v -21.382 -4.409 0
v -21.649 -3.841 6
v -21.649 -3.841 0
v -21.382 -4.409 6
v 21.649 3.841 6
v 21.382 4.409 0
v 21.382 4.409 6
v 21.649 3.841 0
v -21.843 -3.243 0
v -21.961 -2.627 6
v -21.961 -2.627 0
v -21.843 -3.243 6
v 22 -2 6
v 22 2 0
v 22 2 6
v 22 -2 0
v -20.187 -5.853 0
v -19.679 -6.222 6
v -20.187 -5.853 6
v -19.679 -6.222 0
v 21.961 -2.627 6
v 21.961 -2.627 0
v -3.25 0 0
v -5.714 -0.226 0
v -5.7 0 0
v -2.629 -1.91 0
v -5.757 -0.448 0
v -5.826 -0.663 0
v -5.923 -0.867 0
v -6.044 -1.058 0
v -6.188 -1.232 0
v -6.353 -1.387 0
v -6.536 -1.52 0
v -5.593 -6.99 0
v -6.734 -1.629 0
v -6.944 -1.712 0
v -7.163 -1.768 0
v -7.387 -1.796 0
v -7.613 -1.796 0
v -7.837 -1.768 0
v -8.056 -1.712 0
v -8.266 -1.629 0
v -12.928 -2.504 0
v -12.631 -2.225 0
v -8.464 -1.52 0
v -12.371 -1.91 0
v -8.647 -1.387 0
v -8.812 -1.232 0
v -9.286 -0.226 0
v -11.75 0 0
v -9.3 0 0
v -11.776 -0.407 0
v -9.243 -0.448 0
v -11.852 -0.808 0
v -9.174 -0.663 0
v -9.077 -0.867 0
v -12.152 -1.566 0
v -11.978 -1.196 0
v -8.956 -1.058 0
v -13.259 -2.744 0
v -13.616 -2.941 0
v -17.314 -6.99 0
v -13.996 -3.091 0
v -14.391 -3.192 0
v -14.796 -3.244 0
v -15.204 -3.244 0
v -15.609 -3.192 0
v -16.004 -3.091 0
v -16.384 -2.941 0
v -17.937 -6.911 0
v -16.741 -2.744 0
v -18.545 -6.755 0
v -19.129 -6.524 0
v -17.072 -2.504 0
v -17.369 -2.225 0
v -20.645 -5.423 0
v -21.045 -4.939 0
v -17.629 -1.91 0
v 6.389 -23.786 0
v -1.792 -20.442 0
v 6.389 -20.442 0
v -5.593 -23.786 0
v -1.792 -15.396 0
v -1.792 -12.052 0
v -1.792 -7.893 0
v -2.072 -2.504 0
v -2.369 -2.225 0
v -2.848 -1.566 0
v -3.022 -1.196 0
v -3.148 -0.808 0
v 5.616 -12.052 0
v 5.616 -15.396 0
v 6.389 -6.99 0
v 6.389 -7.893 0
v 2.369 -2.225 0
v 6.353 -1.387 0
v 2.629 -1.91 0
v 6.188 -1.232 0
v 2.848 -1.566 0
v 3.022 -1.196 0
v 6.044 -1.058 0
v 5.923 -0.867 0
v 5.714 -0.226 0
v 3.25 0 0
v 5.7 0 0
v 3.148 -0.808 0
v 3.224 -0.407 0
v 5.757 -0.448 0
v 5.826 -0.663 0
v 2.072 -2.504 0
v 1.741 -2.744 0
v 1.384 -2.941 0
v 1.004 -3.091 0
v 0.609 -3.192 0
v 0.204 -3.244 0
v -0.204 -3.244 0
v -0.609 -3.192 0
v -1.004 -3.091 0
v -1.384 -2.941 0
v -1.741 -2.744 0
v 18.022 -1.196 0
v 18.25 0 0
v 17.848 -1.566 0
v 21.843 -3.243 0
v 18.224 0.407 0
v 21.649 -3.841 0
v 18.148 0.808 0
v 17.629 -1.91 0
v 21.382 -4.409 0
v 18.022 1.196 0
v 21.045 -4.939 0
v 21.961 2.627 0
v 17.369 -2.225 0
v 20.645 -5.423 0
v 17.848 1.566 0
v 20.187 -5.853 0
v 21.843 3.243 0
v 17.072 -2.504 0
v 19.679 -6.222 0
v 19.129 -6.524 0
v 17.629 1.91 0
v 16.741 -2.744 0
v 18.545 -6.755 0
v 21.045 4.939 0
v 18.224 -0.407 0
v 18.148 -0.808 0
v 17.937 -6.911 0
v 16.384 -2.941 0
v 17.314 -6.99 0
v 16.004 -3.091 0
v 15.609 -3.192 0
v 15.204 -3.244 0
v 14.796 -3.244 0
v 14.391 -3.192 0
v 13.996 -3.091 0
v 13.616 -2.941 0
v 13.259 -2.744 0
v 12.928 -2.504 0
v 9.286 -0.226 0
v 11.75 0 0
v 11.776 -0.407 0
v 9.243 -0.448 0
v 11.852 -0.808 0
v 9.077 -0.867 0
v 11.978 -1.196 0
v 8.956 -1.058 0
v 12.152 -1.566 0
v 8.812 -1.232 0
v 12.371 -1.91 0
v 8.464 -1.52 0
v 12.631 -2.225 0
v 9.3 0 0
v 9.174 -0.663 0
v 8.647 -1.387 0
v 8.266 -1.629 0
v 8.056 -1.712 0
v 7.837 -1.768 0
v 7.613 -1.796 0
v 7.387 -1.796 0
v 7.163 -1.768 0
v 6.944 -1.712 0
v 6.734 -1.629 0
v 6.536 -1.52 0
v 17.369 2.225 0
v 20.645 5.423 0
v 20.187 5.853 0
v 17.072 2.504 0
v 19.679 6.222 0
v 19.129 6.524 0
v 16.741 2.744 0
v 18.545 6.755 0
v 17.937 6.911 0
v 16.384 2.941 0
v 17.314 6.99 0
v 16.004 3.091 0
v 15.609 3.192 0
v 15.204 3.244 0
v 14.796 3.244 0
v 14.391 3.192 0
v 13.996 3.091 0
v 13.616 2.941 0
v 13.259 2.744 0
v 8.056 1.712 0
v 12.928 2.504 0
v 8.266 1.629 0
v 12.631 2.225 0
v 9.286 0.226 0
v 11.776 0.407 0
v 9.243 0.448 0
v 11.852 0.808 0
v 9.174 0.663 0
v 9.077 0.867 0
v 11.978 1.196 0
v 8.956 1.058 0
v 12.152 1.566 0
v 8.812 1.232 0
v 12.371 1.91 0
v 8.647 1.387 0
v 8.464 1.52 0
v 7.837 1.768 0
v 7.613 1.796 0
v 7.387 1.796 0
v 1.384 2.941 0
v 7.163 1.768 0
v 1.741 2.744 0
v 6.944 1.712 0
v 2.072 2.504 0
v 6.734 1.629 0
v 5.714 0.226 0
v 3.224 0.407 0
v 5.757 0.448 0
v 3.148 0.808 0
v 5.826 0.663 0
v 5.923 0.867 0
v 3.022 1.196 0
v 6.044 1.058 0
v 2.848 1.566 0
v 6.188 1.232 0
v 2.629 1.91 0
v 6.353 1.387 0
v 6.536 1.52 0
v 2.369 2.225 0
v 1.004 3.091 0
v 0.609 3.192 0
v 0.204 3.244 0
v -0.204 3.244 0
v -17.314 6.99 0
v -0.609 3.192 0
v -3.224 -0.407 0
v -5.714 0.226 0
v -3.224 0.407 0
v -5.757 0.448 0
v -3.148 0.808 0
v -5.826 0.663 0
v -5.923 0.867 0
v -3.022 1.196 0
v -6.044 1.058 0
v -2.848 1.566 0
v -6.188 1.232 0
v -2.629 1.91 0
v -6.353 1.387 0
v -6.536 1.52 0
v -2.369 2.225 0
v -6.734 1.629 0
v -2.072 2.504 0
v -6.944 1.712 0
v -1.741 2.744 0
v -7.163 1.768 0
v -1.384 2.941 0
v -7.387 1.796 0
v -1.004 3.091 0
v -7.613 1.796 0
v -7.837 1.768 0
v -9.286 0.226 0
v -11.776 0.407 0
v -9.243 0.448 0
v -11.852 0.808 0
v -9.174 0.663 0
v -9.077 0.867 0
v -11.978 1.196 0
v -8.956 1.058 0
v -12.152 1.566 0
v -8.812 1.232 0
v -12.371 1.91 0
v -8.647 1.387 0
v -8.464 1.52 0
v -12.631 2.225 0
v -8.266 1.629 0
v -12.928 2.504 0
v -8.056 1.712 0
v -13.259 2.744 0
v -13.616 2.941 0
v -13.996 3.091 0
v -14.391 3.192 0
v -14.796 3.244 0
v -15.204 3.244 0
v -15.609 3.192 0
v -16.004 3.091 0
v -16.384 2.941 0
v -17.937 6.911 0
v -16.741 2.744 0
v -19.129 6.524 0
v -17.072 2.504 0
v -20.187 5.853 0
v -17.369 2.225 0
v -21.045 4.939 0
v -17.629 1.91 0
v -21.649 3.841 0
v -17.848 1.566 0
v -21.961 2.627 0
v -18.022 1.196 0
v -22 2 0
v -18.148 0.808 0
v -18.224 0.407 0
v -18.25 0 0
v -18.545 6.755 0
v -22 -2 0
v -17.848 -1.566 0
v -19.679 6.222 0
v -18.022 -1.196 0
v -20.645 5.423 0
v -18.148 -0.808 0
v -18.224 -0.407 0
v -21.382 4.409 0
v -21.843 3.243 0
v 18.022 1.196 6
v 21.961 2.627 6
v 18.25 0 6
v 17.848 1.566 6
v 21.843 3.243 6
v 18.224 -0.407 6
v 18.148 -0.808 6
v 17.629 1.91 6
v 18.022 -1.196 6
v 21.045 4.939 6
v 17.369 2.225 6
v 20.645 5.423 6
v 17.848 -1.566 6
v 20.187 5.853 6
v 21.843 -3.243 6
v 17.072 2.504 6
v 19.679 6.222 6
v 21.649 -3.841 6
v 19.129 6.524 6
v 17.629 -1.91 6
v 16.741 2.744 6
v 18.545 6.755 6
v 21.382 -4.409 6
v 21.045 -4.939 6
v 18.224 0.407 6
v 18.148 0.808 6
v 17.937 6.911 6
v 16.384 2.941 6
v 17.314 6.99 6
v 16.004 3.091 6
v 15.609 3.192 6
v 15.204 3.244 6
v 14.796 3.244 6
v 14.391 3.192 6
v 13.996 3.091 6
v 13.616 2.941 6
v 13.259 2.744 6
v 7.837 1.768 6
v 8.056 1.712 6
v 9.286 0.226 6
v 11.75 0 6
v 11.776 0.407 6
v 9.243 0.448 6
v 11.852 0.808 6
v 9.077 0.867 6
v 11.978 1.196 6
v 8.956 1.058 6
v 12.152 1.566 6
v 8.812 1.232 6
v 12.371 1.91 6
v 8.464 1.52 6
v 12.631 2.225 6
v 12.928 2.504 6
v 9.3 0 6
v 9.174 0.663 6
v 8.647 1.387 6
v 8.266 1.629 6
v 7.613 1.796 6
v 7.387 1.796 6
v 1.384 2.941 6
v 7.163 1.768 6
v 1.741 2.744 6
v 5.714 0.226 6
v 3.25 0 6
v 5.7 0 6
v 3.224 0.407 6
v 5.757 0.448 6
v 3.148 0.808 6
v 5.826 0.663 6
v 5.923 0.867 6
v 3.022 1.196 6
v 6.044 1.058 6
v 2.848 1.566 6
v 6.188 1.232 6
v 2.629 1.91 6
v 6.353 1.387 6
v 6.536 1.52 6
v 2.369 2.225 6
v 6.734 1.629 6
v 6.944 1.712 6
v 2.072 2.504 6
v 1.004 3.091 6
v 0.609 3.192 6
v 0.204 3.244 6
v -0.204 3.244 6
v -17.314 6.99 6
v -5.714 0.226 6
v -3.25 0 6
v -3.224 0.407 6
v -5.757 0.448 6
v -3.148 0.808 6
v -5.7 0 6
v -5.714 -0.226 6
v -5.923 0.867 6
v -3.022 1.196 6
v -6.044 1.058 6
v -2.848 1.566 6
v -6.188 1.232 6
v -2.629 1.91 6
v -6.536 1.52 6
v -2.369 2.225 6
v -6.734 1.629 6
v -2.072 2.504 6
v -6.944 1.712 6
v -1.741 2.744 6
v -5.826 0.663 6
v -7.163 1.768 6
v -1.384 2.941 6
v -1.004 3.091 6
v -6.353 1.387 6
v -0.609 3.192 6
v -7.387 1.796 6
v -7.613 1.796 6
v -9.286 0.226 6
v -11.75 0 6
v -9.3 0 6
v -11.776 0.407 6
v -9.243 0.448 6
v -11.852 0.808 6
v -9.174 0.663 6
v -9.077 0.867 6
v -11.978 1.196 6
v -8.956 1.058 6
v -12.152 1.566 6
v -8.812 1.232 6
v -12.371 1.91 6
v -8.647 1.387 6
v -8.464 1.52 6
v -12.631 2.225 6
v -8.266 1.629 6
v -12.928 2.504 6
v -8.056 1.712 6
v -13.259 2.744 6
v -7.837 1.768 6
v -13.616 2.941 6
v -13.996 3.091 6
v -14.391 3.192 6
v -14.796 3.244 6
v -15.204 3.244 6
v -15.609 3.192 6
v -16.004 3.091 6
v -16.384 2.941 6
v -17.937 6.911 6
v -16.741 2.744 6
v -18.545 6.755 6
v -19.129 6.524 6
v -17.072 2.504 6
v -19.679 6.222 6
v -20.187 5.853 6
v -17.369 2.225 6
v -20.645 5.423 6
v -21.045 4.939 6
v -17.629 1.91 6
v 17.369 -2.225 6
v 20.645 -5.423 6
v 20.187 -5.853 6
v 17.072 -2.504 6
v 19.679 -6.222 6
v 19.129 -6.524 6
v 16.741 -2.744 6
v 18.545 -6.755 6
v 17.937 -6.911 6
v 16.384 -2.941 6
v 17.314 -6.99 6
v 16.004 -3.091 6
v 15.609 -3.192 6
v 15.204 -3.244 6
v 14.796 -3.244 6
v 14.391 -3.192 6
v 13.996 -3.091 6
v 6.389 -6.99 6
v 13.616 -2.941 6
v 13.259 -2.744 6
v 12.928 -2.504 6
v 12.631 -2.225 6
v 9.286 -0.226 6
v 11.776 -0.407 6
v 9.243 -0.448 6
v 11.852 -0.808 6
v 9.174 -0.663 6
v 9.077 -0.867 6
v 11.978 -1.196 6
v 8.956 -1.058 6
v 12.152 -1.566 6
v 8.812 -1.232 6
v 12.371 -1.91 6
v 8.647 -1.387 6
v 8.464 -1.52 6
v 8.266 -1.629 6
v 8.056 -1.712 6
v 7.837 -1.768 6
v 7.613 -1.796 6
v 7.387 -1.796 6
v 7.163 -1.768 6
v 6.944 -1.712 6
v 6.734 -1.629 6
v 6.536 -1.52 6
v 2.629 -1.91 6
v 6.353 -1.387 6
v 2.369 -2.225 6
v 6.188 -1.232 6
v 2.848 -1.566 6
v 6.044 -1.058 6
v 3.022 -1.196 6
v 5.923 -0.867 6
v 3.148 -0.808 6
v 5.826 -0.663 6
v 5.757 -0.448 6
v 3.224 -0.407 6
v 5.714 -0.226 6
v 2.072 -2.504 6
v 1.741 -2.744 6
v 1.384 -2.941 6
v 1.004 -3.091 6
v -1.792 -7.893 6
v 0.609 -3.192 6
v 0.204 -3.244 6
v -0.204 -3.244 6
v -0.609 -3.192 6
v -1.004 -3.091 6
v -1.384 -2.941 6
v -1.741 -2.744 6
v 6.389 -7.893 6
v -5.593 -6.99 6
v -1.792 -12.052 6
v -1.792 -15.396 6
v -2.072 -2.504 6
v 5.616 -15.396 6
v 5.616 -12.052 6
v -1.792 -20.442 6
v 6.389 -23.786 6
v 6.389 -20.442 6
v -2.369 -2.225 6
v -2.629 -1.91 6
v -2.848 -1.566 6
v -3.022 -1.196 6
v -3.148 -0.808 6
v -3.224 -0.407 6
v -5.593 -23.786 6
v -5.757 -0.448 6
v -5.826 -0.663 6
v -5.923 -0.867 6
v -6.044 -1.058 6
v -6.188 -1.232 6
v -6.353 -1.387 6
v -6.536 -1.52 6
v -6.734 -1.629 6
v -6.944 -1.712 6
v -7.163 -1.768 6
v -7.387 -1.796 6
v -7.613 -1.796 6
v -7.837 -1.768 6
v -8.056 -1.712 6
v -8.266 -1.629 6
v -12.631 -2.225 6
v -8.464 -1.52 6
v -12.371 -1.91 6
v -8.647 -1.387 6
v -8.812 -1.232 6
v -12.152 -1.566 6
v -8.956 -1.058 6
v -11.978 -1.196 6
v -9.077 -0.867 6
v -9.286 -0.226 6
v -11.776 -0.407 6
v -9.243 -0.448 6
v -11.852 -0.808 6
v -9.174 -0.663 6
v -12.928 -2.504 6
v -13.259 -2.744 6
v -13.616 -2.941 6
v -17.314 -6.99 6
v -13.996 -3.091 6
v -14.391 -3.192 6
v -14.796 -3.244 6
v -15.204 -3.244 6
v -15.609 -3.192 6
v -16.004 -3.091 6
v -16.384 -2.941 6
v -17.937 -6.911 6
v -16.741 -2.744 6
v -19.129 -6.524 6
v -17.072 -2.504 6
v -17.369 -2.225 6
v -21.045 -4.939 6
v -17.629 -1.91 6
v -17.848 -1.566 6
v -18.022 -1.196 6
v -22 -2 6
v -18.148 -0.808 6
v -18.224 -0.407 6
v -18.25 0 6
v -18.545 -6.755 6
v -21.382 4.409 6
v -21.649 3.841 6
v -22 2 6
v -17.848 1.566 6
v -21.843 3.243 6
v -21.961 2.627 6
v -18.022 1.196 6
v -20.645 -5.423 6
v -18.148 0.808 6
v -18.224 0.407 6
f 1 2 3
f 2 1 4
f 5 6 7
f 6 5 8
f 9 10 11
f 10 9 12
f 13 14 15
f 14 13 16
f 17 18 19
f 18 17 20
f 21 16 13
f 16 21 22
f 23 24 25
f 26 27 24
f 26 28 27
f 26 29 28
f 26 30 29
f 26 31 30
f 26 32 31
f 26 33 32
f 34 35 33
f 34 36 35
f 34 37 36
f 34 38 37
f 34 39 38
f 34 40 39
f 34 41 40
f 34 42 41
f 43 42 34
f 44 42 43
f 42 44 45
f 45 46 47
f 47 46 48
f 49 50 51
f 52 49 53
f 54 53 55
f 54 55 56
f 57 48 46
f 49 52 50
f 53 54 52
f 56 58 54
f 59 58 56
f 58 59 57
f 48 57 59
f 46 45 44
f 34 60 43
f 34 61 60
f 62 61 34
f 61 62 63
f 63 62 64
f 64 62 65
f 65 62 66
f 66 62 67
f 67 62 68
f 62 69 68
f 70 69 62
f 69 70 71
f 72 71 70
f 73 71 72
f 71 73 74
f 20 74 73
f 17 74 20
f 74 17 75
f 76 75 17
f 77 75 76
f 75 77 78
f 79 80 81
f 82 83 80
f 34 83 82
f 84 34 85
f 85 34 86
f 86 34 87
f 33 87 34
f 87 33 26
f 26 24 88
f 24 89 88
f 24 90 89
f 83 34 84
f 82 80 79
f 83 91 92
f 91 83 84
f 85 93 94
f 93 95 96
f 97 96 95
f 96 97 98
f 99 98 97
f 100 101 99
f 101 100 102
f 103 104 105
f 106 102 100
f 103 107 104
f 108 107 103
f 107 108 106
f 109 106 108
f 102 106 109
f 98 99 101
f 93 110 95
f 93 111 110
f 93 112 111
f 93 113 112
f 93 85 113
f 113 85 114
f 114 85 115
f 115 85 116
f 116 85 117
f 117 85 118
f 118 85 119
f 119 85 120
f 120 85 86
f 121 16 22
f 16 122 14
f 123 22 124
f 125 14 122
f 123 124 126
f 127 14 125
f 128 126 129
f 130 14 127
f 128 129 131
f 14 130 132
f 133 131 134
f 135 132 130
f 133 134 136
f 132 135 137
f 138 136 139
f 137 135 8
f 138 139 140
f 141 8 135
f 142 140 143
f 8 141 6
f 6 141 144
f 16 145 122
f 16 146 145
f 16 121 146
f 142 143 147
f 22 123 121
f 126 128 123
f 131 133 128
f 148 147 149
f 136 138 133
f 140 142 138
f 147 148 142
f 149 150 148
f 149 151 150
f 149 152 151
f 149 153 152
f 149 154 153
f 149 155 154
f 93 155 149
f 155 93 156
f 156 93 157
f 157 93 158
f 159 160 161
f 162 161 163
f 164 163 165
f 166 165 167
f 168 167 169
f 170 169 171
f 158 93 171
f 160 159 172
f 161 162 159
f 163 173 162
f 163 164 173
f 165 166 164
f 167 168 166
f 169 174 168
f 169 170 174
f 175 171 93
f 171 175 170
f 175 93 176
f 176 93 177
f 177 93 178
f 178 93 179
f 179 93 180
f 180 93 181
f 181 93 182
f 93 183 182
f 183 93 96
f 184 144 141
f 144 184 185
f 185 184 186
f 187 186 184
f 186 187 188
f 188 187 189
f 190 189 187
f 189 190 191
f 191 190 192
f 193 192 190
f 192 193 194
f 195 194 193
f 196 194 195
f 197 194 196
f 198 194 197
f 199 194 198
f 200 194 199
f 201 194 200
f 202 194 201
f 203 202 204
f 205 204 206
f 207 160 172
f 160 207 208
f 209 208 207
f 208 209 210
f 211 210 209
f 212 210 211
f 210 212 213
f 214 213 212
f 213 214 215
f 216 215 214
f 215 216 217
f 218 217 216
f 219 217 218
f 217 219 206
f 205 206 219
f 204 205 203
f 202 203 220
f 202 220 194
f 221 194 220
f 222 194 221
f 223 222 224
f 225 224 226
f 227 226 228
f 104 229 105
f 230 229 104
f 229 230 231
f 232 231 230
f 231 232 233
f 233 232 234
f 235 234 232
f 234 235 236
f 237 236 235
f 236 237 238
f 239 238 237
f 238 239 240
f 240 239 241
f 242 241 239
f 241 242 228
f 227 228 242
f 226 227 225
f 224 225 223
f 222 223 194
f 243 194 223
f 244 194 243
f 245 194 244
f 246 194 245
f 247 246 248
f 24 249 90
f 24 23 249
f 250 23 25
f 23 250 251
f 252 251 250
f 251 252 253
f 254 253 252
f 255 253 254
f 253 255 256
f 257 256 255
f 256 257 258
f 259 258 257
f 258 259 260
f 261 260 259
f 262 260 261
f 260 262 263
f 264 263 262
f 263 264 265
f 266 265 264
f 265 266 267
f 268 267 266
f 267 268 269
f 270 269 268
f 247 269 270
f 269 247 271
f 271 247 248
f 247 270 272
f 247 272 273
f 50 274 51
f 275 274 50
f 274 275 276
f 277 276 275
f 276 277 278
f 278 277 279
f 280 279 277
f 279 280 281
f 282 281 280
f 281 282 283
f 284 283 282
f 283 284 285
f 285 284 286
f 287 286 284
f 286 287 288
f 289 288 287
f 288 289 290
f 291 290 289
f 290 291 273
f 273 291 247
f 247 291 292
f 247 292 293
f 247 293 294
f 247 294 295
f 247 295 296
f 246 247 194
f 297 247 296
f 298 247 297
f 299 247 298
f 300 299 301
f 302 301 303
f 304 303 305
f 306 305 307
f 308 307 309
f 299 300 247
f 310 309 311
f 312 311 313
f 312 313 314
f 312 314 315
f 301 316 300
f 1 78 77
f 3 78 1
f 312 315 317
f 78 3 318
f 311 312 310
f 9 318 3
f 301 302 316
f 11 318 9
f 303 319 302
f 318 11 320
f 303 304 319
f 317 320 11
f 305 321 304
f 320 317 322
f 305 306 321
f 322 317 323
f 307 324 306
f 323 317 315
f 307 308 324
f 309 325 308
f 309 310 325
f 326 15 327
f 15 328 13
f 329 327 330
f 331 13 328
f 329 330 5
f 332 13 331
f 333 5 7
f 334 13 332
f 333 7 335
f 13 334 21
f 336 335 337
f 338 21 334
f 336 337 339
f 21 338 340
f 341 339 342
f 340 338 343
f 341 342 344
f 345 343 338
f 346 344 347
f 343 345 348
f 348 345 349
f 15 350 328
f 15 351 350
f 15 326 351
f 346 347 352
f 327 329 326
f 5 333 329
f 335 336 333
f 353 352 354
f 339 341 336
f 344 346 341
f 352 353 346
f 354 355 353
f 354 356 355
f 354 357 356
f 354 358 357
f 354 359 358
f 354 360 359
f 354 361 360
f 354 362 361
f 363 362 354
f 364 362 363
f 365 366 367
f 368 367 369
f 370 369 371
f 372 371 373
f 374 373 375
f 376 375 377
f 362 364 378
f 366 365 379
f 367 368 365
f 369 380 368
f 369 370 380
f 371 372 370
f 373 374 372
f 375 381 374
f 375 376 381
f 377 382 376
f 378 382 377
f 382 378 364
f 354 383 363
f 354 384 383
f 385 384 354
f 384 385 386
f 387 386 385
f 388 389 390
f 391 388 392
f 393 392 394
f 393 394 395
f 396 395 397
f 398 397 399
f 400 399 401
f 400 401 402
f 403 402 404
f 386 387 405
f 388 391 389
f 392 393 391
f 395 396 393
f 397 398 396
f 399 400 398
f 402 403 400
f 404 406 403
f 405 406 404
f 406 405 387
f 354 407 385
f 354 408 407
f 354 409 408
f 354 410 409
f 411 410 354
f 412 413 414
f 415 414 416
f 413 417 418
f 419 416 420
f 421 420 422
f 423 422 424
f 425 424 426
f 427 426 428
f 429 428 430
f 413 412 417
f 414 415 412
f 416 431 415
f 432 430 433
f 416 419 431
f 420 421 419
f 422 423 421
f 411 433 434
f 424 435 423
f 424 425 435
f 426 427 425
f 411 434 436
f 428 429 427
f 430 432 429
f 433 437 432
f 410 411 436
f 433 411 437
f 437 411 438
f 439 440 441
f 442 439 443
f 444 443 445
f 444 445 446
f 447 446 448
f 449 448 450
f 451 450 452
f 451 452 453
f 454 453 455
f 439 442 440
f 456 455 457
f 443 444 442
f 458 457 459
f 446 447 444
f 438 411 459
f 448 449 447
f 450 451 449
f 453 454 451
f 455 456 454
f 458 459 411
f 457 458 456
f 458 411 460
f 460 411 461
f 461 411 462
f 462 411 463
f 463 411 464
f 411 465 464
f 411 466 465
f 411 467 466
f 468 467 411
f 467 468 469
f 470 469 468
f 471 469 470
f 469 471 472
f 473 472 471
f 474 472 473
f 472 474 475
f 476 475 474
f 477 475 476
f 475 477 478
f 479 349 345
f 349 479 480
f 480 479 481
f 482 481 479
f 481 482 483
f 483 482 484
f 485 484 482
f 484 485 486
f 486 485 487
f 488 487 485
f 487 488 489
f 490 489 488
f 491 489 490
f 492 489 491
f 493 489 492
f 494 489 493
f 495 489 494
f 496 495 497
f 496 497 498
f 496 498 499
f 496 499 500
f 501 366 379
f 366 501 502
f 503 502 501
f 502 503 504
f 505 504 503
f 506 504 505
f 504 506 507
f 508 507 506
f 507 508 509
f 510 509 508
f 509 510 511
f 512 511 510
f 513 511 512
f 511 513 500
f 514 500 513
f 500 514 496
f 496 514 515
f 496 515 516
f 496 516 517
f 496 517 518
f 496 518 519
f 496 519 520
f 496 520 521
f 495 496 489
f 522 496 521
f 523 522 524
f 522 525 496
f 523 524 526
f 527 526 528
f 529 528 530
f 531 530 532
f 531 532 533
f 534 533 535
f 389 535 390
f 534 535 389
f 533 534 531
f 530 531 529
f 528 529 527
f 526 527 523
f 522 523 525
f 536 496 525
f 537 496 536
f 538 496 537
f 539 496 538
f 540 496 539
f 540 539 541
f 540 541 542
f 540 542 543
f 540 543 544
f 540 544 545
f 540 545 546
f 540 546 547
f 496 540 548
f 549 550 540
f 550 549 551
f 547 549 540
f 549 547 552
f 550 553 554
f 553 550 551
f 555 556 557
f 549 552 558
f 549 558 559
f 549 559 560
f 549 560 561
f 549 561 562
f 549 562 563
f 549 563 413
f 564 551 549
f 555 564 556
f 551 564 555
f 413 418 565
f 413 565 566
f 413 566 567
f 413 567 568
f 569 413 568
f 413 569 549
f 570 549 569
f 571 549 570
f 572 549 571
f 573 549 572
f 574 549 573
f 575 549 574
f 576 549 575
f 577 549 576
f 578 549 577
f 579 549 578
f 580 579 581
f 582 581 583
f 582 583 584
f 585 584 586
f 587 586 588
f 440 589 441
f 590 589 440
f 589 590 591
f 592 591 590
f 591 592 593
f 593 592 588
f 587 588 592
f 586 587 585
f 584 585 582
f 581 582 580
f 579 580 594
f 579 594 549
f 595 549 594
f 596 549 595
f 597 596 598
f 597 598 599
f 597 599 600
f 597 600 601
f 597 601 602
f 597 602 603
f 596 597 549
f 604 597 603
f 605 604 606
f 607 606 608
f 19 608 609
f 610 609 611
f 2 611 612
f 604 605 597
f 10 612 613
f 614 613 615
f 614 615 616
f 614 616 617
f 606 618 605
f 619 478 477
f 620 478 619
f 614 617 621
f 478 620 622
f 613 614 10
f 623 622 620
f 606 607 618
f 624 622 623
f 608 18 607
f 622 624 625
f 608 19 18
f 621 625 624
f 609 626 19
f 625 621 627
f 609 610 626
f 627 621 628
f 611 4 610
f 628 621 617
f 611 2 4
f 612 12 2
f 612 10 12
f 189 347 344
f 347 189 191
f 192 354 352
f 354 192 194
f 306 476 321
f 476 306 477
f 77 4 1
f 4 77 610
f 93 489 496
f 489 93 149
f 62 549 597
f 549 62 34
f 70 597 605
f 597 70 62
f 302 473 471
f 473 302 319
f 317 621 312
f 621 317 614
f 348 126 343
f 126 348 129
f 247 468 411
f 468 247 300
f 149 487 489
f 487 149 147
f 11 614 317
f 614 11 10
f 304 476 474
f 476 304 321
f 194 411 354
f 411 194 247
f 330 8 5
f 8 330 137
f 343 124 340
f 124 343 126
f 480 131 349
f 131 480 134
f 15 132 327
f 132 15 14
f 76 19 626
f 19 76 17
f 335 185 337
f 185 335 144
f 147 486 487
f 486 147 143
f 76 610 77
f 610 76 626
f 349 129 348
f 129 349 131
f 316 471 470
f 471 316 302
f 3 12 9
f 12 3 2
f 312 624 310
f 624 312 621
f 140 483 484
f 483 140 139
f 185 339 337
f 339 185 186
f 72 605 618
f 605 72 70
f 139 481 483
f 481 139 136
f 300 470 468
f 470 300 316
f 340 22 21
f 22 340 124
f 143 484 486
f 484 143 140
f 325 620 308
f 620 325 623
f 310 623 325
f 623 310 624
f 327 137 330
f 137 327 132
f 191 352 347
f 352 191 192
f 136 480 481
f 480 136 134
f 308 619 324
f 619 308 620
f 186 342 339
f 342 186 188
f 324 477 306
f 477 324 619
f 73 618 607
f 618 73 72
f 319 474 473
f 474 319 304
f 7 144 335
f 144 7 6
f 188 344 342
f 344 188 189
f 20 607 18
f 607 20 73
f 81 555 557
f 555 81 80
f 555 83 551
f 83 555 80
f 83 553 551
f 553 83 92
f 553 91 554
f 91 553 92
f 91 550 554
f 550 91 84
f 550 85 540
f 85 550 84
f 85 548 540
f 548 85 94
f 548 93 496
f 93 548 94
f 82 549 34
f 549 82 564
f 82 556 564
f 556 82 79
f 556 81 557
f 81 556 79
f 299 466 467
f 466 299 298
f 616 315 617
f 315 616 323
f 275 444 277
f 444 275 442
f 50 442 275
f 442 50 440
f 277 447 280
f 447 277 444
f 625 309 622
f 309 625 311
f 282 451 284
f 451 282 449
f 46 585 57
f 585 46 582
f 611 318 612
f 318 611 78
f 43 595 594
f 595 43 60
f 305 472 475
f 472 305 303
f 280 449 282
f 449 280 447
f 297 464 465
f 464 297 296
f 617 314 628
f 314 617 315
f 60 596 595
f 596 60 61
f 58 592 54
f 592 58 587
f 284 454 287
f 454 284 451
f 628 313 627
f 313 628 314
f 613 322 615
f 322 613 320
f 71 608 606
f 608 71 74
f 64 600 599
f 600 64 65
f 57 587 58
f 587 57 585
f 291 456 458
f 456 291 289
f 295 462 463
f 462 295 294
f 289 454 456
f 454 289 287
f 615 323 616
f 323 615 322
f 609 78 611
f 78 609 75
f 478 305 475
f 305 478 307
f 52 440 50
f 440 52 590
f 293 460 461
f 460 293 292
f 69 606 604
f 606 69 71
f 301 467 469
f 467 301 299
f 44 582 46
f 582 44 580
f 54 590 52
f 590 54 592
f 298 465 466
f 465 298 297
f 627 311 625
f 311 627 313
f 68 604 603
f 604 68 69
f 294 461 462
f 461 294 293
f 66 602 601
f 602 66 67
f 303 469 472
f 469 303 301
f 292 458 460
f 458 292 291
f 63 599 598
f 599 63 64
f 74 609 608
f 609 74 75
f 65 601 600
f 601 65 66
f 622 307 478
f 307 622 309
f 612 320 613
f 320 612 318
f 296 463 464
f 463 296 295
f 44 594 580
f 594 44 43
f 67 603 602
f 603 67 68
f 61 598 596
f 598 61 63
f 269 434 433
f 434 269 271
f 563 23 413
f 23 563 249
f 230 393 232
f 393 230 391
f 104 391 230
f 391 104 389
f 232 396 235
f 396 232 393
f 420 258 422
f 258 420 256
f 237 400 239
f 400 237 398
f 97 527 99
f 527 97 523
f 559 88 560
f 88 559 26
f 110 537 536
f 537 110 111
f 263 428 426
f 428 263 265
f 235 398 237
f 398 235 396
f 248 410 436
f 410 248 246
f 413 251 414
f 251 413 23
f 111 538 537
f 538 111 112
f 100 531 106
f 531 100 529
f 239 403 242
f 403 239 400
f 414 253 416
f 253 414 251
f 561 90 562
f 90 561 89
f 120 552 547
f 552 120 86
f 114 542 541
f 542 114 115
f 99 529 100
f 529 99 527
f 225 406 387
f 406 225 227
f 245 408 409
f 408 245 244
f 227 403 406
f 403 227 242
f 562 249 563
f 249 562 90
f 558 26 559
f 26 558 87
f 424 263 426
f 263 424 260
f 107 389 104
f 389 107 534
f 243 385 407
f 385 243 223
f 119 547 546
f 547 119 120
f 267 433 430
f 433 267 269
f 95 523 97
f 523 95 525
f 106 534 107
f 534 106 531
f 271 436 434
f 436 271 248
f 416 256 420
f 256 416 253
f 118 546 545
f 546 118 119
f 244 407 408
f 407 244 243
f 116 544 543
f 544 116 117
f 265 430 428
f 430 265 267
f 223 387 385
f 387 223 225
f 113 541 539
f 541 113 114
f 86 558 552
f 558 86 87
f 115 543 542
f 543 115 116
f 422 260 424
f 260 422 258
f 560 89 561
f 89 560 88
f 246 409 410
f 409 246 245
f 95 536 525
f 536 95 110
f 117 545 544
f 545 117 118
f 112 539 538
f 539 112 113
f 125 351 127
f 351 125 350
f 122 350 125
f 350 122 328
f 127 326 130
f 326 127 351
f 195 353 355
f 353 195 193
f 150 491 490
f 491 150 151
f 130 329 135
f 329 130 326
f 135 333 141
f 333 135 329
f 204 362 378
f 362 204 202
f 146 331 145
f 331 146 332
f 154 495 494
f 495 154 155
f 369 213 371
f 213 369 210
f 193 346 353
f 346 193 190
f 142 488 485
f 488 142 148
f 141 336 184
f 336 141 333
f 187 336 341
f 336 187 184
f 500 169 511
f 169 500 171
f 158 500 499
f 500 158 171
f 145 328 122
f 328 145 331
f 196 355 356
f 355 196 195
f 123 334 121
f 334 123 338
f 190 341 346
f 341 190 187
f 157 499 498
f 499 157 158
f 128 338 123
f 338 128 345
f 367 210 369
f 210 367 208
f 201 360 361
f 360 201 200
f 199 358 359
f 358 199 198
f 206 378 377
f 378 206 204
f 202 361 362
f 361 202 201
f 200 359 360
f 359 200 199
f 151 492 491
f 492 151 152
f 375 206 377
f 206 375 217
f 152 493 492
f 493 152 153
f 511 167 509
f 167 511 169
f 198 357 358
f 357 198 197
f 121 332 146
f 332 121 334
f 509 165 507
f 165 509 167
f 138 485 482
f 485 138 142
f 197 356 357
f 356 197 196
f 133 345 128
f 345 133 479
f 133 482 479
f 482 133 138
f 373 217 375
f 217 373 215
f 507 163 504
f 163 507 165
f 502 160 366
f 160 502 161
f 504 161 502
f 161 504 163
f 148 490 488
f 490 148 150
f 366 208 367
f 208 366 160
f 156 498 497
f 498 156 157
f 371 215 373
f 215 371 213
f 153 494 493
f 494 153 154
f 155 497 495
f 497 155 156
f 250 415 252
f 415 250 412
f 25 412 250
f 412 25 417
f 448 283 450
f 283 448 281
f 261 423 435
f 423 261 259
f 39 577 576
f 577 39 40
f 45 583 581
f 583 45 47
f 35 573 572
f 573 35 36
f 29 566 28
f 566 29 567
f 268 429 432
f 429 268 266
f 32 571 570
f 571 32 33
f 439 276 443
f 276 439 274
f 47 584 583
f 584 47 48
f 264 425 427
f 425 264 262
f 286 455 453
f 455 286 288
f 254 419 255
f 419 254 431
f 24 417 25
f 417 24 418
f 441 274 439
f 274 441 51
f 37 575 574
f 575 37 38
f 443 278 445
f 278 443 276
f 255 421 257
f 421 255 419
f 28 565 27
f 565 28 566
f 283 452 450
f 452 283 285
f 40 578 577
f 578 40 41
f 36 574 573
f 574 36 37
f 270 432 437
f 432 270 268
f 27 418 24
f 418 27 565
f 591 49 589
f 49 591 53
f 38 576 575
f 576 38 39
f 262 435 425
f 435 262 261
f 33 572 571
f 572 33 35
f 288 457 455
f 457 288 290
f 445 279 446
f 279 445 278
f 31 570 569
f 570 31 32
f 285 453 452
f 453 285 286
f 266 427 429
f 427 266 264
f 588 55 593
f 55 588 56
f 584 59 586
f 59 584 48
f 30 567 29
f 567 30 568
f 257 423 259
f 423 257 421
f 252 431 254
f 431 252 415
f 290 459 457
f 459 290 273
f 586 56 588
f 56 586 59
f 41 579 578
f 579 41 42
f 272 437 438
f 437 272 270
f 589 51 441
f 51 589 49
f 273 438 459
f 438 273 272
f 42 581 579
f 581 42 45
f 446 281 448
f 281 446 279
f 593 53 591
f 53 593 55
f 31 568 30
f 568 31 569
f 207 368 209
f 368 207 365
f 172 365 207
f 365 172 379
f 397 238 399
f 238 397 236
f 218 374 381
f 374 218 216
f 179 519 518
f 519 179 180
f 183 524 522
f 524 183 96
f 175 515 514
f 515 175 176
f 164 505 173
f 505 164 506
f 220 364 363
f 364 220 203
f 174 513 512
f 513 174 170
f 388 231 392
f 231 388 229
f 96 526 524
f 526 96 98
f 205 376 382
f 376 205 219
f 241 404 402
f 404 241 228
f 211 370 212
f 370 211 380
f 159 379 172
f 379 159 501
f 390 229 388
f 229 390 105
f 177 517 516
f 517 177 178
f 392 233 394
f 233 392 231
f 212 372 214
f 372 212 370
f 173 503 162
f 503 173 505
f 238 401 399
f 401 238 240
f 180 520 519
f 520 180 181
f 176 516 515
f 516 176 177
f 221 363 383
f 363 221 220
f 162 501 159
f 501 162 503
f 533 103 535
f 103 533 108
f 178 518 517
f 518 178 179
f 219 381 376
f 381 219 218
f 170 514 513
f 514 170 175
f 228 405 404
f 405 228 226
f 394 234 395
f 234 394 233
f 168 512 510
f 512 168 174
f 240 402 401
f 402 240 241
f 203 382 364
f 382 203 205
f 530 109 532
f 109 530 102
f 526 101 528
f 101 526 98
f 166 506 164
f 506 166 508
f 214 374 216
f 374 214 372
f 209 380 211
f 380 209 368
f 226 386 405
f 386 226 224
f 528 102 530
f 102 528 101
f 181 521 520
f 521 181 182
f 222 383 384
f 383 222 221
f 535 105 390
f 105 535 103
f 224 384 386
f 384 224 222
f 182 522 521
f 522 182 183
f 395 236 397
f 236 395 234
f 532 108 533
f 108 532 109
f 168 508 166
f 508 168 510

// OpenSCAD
$fn = 50;


difference() {
	union() {
		hull() {
			translate(v = [-17.0000000000, 2.0000000000, 0]) {
				cylinder(h = 6, r = 5);
			}
			translate(v = [17.0000000000, 2.0000000000, 0]) {
				cylinder(h = 6, r = 5);
			}
			translate(v = [-17.0000000000, -2.0000000000, 0]) {
				cylinder(h = 6, r = 5);
			}
			translate(v = [17.0000000000, -2.0000000000, 0]) {
				cylinder(h = 6, r = 5);
			}
		}
		translate(v = [0, -5, 0]) {
			linear_extrude(height = 6) {
				text(font = "DejaVu Sans Mono:style=Bold", halign = "center", size = 19.0000000000, text = "E", valign = "top");
			}
		}
	}
	union() {
		translate(v = [-15.0000000000, 0.0000000000, 0]) {
			translate(v = [0, 0, -100]) {
				cylinder(h = 200, r = 3.2500000000);
			}
		}
		translate(v = [0, 0, -100]) {
			cylinder(h = 200, r = 3.2500000000);
		}
		translate(v = [15.0000000000, 0.0000000000, 0]) {
			translate(v = [0, 0, -100]) {
				cylinder(h = 200, r = 3.2500000000);
			}
		}
		translate(v = [-15.0000000000, 0.0000000000, 0]) {
			translate(v = [0, 0, -100]) {
				cylinder(h = 200, r = 1.8000000000);
			}
		}
		translate(v = [-7.5000000000, 0.0000000000, 0]) {
			translate(v = [0, 0, -100]) {
				cylinder(h = 200, r = 1.8000000000);
			}
		}
		translate(v = [0, 0, -100]) {
			cylinder(h = 200, r = 1.8000000000);
		}
		translate(v = [7.5000000000, 0.0000000000, 0]) {
			translate(v = [0, 0, -100]) {
				cylinder(h = 200, r = 1.8000000000);
			}
		}
		translate(v = [15.0000000000, 0.0000000000, 0]) {
			translate(v = [0, 0, -100]) {
				cylinder(h = 200, r = 1.8000000000);
			}
		}
	}
}
